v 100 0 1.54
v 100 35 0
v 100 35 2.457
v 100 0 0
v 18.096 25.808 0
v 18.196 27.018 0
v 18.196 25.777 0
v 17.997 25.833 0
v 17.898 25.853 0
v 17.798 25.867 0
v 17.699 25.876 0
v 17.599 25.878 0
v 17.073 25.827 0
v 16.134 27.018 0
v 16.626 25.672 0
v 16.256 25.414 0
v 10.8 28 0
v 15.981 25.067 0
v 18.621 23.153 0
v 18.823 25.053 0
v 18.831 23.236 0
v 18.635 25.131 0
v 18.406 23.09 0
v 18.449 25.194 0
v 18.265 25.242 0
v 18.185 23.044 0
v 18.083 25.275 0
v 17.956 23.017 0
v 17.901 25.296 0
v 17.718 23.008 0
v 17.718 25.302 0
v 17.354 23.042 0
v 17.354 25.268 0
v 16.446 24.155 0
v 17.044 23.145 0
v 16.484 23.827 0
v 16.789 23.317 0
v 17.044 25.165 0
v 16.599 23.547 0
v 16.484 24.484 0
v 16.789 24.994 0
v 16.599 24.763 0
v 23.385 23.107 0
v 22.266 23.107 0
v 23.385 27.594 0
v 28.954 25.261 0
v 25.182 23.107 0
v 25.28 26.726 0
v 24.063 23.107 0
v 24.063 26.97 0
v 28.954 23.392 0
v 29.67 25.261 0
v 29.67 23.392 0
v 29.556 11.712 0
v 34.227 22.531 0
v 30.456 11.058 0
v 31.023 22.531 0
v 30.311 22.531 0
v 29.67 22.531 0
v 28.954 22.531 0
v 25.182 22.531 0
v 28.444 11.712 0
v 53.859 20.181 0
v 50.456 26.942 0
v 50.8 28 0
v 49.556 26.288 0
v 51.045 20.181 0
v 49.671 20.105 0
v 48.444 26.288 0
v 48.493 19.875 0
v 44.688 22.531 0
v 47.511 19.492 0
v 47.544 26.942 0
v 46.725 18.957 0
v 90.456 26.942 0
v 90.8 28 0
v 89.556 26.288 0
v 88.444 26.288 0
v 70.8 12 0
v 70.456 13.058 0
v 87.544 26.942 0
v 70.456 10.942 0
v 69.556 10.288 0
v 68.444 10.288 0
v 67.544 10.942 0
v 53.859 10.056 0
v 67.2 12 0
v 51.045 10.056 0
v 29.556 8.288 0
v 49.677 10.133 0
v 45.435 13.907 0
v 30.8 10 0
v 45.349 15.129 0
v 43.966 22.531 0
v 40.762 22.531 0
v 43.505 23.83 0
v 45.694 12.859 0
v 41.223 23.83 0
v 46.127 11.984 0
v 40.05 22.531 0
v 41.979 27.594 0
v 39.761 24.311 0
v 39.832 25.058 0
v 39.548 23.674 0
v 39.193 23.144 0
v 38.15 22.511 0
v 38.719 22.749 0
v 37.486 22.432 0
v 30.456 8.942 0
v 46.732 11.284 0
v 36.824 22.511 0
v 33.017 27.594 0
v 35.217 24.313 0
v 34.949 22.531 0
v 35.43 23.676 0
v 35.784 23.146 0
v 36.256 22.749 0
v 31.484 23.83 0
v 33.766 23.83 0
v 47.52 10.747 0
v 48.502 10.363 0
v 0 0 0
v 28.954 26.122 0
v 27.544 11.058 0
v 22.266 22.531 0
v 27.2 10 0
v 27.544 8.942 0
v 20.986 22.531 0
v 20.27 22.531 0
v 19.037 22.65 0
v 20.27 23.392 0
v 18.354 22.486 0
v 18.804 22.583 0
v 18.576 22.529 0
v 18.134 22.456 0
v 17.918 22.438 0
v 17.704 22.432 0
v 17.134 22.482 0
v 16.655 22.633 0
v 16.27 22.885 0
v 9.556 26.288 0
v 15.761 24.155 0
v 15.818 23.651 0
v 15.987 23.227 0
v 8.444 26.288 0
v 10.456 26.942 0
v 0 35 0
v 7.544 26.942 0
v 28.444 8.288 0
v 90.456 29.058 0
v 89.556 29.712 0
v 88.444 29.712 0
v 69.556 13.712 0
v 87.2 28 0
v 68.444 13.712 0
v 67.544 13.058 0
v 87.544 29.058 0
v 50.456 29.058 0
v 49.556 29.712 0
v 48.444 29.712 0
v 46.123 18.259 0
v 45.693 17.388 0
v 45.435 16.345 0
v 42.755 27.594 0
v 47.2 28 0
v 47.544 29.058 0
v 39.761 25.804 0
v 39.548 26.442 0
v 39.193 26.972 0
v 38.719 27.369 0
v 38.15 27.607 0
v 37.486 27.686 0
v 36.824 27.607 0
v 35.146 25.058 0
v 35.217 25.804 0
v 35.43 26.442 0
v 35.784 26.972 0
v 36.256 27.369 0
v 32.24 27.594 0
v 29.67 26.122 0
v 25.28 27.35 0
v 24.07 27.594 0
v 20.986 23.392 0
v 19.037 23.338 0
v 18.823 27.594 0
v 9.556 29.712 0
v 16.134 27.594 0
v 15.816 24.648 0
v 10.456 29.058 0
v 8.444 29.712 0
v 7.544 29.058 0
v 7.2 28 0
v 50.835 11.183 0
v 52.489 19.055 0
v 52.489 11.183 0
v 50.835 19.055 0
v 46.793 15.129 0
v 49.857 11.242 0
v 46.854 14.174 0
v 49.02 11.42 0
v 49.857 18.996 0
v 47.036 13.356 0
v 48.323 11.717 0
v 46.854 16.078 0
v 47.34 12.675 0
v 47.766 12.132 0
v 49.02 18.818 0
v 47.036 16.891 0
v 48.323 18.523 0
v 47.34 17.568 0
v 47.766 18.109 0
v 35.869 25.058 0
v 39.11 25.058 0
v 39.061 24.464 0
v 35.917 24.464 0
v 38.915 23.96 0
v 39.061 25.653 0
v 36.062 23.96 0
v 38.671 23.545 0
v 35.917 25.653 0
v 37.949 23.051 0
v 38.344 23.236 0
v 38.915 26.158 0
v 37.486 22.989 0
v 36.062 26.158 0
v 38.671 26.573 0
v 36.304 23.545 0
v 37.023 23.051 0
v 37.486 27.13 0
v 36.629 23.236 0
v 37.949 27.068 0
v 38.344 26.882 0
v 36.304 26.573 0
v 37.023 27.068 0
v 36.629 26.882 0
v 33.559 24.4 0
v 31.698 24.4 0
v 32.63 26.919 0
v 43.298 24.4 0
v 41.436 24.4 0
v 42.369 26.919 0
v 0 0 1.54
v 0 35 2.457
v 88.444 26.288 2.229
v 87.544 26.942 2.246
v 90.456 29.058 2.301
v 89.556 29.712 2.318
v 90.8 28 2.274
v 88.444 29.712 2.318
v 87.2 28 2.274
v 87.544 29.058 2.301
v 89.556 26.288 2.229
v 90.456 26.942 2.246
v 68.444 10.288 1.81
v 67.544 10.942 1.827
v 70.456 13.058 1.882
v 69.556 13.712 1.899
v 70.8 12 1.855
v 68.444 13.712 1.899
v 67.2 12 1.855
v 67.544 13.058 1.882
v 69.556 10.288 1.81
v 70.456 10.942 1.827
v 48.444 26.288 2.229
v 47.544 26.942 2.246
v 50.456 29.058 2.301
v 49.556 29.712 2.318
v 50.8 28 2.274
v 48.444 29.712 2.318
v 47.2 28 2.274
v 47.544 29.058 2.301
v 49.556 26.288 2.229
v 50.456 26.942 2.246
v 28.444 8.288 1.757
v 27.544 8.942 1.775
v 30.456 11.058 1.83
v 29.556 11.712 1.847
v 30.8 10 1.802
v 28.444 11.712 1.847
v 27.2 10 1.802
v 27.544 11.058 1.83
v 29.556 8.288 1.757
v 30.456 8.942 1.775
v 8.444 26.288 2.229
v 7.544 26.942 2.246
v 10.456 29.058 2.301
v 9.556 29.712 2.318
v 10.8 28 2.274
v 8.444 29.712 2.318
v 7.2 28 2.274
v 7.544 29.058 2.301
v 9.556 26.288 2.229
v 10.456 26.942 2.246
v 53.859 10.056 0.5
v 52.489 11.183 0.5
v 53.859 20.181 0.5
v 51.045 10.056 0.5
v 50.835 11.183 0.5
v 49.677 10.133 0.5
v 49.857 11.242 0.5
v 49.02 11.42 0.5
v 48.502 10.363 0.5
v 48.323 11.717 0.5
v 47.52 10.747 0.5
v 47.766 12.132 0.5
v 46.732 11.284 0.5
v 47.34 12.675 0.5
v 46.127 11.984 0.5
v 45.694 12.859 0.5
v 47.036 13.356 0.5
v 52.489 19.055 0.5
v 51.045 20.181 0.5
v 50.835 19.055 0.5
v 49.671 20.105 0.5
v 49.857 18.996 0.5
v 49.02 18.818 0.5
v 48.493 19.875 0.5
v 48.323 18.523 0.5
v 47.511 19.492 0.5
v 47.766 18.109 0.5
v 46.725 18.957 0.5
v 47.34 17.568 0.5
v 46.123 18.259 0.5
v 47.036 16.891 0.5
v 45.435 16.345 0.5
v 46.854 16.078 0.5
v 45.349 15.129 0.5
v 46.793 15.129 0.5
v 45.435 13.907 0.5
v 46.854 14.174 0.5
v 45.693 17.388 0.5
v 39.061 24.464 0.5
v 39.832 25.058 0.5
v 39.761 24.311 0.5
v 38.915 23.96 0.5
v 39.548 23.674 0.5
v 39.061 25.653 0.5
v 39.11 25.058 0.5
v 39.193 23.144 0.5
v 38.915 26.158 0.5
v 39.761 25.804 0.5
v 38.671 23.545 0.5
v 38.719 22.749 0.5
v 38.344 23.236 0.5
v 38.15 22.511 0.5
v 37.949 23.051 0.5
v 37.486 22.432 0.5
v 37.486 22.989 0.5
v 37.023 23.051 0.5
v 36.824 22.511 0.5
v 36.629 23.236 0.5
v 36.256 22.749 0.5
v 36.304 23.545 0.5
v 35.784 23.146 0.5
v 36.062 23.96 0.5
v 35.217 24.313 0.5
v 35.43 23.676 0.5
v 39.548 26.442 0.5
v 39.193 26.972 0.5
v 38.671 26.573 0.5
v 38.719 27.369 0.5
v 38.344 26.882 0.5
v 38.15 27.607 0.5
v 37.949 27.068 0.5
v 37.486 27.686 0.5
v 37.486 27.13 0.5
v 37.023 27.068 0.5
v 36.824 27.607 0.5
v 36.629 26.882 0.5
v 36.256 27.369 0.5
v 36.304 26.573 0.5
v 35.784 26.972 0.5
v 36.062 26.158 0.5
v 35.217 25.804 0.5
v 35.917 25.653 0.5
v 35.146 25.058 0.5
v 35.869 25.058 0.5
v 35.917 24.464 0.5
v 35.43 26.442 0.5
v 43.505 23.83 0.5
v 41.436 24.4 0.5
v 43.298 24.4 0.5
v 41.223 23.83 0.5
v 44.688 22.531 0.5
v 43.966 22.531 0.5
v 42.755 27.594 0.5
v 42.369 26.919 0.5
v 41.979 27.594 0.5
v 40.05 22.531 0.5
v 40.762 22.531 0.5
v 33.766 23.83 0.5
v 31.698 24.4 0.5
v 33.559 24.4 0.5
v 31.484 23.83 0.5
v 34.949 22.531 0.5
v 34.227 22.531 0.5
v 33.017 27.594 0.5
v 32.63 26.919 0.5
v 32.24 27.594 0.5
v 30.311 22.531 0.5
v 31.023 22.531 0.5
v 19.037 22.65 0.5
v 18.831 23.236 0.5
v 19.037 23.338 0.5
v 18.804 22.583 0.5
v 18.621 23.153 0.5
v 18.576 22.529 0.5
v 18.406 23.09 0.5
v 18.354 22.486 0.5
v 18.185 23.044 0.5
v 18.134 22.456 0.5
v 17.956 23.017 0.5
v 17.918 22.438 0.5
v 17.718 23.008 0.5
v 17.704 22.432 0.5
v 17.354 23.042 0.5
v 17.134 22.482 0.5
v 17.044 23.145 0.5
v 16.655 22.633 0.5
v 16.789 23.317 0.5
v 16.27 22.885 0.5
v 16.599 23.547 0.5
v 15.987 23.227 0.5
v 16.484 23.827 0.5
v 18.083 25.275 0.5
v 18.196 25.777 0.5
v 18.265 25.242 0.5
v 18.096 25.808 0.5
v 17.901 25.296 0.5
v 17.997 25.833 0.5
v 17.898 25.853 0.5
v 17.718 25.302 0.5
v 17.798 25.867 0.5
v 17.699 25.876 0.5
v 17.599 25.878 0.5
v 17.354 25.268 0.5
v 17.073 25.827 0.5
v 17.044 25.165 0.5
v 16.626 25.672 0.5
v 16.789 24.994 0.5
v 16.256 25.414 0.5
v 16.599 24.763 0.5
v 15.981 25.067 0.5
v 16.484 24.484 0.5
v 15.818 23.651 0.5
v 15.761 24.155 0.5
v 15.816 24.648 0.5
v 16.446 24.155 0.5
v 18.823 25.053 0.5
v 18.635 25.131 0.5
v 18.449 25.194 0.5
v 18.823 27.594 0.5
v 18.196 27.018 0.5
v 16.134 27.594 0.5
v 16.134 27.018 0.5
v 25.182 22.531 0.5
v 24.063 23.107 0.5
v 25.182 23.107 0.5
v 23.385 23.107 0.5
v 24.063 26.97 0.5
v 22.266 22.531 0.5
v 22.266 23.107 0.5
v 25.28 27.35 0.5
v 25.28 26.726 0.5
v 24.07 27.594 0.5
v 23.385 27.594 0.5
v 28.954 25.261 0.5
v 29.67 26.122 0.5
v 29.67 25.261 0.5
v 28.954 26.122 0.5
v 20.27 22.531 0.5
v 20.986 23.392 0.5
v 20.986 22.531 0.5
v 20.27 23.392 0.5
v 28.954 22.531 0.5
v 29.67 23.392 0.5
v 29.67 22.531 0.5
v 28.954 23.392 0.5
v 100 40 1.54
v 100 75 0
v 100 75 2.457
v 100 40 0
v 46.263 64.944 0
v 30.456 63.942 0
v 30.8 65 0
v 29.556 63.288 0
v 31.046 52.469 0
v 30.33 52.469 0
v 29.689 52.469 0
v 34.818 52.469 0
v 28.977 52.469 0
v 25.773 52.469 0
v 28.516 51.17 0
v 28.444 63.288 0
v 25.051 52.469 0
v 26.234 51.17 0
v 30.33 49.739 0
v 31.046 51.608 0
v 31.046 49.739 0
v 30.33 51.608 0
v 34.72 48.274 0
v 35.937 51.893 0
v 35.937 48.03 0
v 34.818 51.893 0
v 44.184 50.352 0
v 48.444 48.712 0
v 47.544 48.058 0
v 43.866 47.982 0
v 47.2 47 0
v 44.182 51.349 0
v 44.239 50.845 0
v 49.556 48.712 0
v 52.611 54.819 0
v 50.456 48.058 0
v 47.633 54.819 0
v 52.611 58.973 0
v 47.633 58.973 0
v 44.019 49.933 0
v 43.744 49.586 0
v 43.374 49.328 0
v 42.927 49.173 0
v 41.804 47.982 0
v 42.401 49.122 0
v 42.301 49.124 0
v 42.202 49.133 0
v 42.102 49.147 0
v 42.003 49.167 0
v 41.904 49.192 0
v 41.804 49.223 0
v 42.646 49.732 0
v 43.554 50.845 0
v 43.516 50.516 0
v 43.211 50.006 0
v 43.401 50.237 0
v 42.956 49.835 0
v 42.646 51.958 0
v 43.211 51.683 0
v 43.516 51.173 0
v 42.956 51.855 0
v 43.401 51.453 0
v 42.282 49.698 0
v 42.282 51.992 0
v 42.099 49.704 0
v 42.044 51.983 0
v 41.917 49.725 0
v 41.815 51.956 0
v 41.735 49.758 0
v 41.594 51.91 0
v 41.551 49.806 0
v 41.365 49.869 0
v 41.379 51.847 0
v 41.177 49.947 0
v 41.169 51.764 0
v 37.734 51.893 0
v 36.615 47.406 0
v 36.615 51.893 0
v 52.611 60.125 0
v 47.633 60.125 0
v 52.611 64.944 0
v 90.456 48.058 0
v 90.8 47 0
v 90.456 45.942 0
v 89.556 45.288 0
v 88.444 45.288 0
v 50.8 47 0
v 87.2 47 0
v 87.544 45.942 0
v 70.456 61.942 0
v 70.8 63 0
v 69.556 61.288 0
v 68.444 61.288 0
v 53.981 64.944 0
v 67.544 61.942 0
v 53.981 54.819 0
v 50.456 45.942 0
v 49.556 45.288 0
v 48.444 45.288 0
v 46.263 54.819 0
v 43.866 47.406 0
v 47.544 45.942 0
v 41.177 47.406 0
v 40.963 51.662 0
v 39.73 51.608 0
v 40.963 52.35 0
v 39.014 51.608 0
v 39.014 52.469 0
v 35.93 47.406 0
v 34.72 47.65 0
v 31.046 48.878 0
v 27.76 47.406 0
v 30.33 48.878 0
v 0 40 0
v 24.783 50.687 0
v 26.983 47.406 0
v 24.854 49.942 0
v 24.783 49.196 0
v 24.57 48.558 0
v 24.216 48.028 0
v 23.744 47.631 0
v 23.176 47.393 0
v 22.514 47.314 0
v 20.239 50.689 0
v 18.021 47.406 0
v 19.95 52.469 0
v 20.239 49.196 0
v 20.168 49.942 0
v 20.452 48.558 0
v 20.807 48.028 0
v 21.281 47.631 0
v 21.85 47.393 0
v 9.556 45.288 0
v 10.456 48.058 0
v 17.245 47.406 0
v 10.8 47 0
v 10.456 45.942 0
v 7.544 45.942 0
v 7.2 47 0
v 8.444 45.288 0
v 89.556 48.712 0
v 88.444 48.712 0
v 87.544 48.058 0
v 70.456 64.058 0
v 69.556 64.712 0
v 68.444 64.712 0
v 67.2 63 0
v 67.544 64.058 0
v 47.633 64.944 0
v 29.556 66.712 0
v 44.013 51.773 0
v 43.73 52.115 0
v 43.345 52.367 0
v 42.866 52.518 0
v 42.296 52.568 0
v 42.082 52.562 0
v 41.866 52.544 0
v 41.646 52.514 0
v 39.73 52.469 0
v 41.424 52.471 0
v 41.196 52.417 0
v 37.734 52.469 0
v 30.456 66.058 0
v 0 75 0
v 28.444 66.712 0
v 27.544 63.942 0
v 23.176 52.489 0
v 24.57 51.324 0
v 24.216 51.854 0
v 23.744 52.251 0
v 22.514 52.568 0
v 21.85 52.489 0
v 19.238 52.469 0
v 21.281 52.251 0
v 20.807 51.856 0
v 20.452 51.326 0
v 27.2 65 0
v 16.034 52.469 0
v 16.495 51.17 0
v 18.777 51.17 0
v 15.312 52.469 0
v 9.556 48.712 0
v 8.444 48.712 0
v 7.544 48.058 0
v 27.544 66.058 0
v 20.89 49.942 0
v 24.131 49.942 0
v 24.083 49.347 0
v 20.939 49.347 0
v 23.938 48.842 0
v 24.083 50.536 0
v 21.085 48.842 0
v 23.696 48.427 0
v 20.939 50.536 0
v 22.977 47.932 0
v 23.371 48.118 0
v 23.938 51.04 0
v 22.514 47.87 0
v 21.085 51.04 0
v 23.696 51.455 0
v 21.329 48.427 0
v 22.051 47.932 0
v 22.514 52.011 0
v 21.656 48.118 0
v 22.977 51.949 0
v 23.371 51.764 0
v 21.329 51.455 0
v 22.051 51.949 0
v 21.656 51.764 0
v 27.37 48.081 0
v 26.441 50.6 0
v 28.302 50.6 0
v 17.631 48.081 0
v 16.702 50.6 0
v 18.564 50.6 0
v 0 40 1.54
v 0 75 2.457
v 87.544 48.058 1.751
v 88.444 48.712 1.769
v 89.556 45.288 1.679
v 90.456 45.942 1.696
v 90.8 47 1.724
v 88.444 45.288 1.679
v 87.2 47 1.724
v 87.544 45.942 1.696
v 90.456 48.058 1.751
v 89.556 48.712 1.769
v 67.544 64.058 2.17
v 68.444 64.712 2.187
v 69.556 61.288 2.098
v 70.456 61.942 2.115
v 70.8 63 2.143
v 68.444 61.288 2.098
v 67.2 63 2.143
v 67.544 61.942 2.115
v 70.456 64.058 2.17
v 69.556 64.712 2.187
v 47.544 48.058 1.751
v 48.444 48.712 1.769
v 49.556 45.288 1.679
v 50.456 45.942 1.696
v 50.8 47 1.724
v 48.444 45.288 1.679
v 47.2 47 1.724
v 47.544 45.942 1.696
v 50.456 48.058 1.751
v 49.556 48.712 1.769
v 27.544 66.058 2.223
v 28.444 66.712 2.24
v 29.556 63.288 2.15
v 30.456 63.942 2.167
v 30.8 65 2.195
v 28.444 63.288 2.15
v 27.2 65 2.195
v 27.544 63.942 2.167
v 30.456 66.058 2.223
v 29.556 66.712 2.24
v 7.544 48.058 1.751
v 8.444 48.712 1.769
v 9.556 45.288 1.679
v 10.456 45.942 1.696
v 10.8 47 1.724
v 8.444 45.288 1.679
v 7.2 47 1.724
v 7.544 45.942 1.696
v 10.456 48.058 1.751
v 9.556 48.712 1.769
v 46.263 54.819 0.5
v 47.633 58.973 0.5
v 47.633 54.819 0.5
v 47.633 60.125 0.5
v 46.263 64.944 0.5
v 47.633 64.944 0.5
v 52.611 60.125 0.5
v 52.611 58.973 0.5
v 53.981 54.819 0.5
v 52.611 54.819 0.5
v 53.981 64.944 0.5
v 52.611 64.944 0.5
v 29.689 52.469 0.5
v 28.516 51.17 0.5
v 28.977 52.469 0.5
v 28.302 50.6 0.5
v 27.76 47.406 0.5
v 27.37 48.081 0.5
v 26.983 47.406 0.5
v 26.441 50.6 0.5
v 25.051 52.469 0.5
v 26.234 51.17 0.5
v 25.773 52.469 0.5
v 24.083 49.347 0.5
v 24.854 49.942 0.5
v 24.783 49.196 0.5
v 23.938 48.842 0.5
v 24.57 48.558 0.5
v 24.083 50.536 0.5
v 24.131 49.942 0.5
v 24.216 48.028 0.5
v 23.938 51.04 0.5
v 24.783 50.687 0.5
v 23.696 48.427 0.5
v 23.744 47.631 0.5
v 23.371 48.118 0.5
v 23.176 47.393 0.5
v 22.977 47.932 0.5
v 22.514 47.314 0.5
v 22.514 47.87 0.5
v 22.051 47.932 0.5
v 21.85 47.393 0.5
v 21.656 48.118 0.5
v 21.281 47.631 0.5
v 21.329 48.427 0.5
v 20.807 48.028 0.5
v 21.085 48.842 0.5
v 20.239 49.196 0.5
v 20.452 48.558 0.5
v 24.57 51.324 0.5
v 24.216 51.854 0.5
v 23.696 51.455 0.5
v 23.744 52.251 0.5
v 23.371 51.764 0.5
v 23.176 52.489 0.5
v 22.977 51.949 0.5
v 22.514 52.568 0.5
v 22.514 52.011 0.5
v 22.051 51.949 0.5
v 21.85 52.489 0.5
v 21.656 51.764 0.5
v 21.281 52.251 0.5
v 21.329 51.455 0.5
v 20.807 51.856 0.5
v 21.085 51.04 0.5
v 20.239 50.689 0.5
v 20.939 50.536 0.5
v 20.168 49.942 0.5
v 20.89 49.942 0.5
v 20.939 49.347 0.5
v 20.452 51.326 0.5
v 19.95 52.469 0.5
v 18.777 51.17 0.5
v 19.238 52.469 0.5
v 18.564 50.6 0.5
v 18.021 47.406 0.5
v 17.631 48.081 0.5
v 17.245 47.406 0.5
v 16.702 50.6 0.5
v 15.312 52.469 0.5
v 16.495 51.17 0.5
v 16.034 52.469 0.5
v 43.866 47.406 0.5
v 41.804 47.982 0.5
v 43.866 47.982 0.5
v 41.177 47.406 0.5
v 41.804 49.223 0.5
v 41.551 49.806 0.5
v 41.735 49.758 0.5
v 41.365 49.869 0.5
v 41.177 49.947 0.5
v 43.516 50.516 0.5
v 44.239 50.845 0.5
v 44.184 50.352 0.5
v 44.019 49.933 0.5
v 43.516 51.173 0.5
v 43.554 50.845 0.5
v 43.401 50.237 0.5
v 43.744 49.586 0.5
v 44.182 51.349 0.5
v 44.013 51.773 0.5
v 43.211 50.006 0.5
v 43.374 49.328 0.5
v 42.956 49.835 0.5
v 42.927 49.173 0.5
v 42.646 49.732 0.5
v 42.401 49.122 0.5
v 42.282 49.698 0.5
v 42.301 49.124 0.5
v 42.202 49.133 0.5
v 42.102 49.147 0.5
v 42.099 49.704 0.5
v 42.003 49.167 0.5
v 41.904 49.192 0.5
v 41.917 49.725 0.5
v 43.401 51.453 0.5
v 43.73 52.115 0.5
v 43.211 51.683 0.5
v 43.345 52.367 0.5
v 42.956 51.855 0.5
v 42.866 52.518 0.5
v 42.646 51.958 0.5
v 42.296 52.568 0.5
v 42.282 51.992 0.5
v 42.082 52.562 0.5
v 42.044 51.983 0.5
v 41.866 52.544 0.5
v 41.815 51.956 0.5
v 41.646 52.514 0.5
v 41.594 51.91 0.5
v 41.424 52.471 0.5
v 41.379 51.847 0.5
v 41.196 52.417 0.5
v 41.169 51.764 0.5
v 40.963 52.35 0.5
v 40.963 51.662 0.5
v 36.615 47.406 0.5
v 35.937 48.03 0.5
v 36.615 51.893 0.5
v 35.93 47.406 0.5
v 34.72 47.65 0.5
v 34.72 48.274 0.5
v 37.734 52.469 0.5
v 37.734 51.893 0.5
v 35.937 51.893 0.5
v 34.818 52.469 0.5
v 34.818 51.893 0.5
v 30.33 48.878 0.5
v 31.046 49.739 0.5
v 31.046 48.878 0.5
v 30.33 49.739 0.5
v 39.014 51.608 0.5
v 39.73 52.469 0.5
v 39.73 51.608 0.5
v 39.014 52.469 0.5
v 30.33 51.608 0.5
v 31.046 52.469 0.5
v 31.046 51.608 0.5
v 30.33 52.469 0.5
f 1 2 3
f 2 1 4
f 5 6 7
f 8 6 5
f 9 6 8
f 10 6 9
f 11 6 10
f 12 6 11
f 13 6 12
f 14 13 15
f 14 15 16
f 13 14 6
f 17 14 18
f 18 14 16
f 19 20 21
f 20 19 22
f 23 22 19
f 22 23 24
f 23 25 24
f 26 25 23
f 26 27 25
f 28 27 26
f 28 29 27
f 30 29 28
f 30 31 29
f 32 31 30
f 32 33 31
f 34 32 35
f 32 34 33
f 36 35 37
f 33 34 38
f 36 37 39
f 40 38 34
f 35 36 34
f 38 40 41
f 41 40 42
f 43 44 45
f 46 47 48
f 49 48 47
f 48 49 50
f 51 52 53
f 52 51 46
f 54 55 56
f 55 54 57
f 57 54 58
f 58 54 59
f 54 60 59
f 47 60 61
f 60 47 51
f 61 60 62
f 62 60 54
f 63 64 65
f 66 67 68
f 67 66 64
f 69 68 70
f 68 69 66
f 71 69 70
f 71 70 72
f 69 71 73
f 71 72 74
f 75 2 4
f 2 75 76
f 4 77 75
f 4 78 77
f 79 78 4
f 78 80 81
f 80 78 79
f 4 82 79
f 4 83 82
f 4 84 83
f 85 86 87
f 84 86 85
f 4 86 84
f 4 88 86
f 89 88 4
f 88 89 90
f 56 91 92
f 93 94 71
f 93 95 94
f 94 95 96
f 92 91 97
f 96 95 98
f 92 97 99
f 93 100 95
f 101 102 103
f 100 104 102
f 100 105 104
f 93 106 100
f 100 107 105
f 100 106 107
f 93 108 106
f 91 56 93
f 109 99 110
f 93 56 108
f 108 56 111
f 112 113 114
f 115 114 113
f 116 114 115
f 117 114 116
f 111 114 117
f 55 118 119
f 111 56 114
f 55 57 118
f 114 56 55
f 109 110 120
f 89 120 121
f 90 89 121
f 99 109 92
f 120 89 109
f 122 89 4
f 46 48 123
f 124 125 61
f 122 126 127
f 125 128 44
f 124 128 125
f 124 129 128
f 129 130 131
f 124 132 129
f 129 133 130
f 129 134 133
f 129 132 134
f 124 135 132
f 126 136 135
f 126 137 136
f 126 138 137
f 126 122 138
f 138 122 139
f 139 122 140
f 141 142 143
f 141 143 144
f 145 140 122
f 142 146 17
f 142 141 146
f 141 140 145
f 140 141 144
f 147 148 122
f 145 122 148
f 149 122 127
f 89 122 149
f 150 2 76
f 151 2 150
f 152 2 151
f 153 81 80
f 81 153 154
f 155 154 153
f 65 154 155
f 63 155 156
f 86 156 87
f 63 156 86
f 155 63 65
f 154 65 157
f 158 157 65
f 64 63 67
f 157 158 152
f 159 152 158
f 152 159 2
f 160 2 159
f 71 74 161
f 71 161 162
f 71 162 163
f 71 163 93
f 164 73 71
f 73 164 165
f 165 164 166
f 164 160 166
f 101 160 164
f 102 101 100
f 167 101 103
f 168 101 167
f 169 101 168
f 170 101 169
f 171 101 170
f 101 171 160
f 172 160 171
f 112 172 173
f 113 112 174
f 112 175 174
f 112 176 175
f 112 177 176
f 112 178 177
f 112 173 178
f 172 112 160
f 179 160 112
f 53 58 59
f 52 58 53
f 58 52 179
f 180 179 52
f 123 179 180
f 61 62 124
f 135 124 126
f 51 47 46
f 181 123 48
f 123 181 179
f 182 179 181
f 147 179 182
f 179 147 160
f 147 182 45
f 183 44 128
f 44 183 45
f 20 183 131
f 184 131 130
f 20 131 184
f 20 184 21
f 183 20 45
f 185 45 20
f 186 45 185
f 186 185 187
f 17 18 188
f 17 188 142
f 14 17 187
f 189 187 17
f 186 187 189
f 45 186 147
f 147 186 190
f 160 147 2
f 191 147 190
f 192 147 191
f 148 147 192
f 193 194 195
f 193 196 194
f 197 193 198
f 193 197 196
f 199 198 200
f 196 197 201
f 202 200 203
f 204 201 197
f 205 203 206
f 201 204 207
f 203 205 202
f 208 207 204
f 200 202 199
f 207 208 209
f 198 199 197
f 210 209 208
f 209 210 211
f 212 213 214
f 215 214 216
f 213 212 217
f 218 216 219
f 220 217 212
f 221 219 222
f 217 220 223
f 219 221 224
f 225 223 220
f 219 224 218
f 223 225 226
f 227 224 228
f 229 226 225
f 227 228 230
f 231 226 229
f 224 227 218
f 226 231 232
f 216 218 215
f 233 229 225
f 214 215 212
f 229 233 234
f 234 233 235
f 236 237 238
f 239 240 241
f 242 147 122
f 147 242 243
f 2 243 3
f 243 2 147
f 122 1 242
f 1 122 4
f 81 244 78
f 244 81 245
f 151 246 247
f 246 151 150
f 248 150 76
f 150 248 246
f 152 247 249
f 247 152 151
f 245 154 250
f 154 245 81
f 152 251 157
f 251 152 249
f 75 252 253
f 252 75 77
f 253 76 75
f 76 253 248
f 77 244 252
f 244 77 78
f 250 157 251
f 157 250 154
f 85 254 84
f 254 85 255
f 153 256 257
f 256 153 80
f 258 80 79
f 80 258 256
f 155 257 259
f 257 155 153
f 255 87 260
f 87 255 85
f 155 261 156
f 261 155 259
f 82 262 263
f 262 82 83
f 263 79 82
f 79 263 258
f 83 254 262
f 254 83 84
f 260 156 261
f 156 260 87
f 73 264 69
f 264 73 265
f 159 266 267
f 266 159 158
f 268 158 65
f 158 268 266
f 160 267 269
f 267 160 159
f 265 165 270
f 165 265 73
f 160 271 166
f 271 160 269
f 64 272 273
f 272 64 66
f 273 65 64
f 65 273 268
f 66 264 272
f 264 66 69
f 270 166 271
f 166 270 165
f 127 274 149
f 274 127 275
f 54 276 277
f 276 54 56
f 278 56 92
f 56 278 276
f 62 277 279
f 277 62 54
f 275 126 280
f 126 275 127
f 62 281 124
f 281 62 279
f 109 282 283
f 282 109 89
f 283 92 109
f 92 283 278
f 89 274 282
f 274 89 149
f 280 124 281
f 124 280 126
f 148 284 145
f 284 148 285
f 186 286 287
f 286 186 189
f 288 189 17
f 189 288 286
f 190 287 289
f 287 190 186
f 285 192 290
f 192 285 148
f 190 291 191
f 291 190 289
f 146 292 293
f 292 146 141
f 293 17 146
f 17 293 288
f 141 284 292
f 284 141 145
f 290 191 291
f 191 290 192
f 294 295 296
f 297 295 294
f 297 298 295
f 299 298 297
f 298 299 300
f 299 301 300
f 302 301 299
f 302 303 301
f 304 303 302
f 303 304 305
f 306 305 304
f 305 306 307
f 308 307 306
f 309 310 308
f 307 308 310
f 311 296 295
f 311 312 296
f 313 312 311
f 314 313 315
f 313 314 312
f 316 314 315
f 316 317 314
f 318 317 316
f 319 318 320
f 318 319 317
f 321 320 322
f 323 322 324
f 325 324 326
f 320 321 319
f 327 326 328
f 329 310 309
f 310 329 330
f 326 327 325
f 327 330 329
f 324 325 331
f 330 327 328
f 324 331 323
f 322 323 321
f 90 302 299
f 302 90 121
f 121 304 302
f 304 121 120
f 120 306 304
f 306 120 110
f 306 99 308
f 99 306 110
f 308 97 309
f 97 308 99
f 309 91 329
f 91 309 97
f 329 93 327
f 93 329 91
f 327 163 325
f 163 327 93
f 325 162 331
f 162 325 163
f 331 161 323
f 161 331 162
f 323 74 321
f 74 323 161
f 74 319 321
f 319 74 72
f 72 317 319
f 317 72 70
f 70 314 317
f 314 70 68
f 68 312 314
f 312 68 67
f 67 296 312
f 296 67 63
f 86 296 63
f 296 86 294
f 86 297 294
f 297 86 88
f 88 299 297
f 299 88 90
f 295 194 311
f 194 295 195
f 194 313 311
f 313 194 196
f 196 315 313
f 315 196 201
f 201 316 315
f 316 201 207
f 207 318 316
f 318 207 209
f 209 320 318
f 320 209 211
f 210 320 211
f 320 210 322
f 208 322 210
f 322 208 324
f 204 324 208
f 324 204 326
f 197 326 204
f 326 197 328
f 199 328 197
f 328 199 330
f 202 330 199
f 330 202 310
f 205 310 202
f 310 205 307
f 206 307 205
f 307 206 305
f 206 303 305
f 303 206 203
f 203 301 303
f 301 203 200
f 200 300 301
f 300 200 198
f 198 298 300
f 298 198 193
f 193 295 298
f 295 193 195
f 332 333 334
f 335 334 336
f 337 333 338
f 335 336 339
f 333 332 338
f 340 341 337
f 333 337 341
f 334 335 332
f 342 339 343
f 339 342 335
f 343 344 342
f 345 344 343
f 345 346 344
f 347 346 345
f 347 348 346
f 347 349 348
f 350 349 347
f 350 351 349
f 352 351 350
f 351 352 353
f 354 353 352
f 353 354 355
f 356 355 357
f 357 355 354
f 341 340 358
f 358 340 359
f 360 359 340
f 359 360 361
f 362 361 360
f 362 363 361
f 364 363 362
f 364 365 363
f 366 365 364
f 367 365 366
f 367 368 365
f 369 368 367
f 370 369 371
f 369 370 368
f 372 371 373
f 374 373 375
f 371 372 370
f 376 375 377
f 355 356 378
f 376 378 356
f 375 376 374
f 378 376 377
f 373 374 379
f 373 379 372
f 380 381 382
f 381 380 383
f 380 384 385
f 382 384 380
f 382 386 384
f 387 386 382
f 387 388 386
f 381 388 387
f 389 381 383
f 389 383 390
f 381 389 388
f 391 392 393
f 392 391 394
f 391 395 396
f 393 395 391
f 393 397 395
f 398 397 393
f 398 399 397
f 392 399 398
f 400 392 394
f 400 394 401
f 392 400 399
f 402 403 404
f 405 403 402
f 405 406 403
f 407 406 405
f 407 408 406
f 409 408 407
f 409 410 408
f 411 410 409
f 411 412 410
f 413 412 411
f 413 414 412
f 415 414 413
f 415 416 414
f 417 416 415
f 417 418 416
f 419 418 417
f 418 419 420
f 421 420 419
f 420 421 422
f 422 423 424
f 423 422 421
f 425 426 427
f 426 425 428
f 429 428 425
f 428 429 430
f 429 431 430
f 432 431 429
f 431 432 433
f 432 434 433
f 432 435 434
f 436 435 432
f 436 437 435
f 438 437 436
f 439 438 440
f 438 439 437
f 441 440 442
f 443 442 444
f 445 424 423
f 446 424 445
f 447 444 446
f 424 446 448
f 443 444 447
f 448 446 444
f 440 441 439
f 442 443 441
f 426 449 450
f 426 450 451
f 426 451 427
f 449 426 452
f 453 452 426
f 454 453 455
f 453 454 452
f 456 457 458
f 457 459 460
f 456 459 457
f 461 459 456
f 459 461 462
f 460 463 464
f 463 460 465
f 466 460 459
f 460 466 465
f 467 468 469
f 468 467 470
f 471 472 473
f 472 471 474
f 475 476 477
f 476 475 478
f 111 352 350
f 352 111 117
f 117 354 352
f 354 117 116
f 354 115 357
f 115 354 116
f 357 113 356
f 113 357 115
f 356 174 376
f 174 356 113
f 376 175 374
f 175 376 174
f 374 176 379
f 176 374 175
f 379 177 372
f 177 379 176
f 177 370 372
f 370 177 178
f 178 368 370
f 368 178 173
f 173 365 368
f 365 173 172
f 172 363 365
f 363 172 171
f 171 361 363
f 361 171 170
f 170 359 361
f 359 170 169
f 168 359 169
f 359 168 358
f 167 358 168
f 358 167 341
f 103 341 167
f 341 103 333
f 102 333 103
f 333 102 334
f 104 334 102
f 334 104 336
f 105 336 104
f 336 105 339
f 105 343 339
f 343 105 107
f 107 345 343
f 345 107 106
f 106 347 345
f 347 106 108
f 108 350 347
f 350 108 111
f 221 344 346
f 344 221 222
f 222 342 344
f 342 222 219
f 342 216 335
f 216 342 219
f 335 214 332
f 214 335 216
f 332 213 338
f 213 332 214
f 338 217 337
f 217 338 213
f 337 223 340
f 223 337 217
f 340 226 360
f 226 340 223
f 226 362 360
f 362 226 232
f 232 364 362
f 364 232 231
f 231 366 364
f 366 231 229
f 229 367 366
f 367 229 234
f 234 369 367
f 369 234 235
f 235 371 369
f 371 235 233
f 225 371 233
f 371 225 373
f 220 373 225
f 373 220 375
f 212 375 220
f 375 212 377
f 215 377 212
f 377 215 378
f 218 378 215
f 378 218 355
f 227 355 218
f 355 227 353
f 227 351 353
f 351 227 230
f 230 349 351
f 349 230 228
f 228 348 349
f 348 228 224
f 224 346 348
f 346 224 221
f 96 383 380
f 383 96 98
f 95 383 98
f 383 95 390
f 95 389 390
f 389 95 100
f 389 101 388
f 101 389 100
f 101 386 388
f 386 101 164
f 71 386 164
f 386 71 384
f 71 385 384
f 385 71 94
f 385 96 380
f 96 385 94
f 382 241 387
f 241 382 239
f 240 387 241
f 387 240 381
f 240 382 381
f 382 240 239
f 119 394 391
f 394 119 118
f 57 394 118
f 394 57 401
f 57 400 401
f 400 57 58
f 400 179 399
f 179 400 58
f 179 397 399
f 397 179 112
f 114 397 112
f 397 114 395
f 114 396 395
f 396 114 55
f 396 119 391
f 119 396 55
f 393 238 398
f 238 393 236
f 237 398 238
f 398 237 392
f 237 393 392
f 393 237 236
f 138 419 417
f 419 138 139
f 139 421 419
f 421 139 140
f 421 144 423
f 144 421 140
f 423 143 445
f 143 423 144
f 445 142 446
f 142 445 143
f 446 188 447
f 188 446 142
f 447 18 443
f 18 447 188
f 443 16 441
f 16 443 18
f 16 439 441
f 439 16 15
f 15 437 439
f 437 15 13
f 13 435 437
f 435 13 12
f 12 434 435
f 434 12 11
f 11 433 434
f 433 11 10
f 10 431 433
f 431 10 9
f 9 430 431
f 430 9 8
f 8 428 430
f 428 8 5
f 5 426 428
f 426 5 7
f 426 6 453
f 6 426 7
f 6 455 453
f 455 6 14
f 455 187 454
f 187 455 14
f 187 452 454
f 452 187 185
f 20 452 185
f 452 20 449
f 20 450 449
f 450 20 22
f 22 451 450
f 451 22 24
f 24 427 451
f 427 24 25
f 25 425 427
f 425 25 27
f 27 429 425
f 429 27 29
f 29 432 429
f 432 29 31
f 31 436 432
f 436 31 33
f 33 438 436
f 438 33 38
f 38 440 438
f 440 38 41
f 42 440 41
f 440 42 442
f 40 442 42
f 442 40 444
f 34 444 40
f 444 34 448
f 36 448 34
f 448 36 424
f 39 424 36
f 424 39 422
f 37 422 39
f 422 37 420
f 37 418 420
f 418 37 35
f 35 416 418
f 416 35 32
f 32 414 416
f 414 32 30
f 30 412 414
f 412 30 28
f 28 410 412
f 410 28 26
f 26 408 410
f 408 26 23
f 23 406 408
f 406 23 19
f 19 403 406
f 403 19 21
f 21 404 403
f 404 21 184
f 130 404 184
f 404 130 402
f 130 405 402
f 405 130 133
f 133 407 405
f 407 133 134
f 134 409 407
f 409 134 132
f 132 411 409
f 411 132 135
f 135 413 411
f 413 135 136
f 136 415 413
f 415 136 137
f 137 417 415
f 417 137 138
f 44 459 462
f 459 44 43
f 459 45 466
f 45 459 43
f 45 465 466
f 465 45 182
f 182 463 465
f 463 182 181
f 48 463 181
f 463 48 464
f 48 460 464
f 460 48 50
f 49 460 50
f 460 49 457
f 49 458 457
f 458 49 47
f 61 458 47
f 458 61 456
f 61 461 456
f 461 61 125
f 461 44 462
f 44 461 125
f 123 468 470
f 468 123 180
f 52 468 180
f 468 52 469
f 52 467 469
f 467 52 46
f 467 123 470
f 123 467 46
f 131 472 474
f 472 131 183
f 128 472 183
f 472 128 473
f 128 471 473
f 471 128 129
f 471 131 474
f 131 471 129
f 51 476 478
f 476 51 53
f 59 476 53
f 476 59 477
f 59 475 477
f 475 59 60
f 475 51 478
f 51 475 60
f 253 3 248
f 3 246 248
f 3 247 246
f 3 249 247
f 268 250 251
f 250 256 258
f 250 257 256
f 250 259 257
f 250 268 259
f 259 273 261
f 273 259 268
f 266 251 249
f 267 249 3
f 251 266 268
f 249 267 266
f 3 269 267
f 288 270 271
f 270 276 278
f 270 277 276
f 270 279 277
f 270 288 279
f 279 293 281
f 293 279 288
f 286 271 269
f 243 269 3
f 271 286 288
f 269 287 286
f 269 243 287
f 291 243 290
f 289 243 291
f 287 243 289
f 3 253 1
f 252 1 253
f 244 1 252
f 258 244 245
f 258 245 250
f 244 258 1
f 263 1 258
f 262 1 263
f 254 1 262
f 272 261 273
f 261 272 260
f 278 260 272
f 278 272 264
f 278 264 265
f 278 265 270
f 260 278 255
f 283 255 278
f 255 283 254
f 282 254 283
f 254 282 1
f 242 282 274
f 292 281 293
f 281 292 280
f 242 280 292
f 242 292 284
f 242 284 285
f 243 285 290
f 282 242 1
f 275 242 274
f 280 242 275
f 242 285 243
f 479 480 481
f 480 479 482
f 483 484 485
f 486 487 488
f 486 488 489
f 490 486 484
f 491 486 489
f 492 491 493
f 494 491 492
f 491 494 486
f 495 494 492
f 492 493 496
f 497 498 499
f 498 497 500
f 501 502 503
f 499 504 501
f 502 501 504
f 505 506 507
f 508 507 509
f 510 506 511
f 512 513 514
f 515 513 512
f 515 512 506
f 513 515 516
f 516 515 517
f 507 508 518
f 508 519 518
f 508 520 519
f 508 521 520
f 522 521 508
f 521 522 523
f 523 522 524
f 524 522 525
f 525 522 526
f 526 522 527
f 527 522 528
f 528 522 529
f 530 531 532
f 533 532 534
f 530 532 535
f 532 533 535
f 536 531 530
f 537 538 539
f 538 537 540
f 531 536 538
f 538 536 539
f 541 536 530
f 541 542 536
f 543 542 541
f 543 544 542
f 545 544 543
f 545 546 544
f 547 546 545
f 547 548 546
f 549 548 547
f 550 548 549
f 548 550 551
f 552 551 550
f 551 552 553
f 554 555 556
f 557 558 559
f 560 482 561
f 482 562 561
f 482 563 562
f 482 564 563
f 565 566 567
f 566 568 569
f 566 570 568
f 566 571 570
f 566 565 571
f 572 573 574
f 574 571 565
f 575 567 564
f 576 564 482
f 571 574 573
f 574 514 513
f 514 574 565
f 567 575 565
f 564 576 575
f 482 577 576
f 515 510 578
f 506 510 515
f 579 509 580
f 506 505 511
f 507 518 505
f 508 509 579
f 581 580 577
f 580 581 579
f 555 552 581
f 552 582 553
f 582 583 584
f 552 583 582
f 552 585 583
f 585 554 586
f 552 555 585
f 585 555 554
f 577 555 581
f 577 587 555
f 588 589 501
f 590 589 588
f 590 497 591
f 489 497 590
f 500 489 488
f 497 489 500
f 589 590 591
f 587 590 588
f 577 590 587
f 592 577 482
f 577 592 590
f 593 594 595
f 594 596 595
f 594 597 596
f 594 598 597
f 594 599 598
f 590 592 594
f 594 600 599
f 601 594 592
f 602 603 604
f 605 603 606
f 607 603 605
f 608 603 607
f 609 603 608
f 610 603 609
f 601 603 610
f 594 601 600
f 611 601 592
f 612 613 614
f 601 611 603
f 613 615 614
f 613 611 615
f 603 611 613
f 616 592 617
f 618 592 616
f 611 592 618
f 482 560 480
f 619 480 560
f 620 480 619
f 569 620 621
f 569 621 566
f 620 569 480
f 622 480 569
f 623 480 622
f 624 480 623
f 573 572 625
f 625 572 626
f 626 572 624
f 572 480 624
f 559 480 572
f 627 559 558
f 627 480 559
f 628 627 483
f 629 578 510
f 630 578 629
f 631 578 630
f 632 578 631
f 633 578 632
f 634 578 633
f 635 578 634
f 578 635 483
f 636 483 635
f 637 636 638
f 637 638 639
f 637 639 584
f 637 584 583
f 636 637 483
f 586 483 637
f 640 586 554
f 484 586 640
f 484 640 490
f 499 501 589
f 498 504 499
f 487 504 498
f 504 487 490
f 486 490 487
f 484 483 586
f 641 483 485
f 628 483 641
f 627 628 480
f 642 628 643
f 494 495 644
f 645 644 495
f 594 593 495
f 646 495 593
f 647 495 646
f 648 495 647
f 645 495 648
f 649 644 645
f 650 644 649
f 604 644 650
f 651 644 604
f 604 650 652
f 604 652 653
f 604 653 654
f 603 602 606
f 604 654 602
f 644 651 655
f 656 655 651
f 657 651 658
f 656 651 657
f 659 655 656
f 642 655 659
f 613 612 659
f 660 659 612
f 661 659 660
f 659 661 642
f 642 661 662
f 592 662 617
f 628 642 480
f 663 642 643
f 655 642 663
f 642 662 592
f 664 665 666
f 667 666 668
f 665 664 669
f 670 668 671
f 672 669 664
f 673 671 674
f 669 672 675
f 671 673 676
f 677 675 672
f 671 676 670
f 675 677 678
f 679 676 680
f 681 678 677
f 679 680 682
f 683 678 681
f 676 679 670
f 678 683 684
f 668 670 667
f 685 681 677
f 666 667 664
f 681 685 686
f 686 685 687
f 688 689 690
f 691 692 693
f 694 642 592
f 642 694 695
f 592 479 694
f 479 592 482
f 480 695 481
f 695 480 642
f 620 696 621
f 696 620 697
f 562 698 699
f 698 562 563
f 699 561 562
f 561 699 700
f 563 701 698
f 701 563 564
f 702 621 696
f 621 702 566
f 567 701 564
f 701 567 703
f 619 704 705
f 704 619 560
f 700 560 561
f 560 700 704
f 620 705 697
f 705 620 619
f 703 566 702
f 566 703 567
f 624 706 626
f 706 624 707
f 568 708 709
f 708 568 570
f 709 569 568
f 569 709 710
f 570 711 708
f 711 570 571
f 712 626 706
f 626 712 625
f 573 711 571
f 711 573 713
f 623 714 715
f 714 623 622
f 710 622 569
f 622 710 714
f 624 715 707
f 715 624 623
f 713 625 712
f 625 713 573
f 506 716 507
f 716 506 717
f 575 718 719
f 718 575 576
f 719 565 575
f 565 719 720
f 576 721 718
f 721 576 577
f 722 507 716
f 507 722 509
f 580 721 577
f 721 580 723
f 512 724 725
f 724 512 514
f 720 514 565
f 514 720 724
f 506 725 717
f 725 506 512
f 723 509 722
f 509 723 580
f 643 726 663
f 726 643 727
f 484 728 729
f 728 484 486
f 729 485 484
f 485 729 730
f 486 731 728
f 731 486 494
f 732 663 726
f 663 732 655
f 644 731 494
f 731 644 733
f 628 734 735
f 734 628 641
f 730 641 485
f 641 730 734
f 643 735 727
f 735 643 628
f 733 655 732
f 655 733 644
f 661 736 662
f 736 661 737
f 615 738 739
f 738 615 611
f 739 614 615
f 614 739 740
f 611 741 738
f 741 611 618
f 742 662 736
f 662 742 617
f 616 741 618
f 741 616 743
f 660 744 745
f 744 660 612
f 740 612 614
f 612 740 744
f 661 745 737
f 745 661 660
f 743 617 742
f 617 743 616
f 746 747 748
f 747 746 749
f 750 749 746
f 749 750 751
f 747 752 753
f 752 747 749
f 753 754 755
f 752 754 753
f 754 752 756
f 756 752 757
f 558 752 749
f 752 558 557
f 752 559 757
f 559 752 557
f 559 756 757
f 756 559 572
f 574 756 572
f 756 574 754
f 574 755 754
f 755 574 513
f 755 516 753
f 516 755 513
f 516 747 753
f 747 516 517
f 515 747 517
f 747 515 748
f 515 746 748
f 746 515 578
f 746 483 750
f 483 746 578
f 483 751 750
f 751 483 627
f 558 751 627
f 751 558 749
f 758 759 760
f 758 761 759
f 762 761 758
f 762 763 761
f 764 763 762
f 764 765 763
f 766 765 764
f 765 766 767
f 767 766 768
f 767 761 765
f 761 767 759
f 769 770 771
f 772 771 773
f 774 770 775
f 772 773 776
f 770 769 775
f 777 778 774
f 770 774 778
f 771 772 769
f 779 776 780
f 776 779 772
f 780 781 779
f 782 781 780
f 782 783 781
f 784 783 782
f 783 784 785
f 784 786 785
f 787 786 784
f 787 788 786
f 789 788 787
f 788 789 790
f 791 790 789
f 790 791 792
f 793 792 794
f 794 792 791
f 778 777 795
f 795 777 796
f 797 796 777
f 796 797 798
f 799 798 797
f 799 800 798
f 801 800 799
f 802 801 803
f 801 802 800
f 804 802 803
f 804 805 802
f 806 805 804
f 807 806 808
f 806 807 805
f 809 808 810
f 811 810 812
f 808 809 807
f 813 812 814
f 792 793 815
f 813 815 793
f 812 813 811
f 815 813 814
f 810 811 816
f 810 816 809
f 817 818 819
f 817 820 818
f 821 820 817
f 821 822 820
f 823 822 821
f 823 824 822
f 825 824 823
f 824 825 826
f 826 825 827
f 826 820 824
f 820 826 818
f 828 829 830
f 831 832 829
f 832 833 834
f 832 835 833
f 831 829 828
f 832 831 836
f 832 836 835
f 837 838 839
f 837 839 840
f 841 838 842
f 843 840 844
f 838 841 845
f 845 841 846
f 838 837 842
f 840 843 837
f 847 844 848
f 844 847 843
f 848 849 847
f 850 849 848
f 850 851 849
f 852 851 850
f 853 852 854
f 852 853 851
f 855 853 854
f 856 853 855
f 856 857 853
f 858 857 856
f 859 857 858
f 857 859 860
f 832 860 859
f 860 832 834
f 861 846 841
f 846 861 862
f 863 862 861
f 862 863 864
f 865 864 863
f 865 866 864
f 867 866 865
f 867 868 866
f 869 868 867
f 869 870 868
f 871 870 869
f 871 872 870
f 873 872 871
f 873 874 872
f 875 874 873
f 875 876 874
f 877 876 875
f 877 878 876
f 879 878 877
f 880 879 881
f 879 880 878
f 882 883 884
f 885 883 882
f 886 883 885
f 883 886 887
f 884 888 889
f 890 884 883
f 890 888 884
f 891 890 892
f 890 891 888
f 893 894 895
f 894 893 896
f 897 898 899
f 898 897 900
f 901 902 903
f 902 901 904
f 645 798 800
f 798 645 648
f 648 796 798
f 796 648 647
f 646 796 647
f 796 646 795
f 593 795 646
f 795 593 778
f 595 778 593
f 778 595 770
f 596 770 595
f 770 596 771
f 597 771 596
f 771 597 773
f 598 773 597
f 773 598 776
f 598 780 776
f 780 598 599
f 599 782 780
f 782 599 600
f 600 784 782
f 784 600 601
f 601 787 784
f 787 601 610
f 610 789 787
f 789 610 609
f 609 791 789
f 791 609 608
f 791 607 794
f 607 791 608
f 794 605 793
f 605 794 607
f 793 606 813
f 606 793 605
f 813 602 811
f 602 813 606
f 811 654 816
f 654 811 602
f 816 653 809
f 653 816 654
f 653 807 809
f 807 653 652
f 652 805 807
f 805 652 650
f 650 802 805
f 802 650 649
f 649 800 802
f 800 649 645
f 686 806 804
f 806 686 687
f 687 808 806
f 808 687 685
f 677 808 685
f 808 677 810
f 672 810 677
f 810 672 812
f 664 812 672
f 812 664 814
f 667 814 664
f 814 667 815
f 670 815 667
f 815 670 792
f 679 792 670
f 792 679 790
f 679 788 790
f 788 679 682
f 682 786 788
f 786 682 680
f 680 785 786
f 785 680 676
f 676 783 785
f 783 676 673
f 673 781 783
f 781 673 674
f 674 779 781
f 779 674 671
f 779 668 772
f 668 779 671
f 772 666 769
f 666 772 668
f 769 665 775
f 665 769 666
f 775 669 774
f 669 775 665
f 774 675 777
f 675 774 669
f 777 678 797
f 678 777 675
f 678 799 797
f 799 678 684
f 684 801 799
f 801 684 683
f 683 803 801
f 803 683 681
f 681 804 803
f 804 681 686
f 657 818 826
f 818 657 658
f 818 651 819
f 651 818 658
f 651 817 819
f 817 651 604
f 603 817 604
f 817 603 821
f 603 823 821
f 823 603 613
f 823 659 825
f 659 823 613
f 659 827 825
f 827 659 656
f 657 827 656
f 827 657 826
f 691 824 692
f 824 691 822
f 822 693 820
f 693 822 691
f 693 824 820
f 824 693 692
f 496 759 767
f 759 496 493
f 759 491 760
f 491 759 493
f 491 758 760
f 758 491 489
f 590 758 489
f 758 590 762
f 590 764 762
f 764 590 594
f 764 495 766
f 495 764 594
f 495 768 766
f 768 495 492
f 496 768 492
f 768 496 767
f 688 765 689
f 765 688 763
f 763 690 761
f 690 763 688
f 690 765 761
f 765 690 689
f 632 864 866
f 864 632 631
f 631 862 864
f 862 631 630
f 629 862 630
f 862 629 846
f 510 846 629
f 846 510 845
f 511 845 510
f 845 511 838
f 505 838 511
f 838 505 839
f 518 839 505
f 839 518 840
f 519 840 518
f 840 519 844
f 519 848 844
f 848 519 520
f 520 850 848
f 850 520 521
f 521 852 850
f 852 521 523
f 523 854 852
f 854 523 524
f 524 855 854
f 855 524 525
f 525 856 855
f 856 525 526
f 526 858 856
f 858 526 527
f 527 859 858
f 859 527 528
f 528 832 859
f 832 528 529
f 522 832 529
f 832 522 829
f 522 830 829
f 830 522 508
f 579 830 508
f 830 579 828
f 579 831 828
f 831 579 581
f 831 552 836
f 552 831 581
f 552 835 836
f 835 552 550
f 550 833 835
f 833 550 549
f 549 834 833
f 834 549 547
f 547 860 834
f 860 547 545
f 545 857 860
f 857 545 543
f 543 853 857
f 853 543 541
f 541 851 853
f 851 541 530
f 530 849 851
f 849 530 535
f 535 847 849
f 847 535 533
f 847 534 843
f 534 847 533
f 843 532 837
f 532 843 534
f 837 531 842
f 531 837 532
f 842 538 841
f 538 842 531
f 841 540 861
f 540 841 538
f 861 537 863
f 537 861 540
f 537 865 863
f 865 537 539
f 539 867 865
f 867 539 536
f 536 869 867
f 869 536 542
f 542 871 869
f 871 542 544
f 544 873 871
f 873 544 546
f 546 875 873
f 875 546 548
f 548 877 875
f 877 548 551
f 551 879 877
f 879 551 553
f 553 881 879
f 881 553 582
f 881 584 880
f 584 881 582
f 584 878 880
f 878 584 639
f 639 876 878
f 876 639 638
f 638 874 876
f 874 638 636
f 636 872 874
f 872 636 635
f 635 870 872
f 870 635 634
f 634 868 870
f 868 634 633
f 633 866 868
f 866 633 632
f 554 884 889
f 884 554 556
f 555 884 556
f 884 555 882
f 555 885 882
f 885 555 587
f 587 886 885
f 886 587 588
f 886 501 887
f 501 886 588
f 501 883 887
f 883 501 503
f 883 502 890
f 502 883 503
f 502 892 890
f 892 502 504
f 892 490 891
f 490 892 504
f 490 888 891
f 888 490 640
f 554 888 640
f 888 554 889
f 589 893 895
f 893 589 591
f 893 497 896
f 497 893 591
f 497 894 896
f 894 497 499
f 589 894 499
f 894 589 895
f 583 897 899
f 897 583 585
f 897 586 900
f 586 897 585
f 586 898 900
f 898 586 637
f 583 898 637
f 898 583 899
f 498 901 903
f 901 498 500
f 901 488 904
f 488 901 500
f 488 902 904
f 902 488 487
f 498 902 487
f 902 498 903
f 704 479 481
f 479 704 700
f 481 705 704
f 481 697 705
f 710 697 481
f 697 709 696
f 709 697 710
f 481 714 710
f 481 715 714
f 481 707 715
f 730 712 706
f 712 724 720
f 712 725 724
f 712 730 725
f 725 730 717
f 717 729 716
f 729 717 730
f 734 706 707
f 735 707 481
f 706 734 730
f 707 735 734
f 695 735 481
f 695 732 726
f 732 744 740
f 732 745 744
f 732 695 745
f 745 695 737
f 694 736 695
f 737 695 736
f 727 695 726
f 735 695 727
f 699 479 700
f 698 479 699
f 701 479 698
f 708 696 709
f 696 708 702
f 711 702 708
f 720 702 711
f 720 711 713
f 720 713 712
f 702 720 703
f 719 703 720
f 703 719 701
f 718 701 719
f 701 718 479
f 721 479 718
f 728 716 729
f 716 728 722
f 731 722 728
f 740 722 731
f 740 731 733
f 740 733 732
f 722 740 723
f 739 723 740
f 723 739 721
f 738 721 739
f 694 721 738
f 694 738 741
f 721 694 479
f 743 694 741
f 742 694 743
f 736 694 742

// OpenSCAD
// file: ../lib/naca4.scad
// Naca4.scad - library for parametric airfoils of 4 digit NACA series
// Code: Rudolf Huttary, Berlin
// June 2015
// commercial use prohibited


// general use: for more examples refer to sampler.scad
// naca = naca digits or 3el vector  (default = 12 or [0, 0, .12])
// L    = chord length [mm]      (default= 100)
// N    = # sample points        (default= 81)
// h    = height [mm]            (default= 1)
// open = close at the thin end? (default = true)
// two equivalent example calls
 airfoil(naca = 2408, L = 60, N=1001, h = 30, open = false);
// airfoil(naca = [.2, .4, .32], L = 60, N=1001, h = 30, open = false);

module help()
{
  echo(str("\n\nList of signatures in lib:\n=================\n",
  "module airfoil(naca=2412, L = 100, N = 81, h = 1, open = false) - renders airfoil object\n",
  "module airfoil(naca=[.2, .4, .12], L = 100, N = 81, h = 1, open = false) - renders airfoil object using percentage for camber,  camber distance and thicknes\n",
  "function airfoil_data(naca=12, L = 100, N = 81, open = false)\n",
  "=================\n"));
}

help();
// this is the object
module airfoil(naca=12, L = 100, N = 81, h = 1, open = false)
{
  linear_extrude(height = h)
  polygon(points = airfoil_data(naca, L, N, open));
}

module hollow_airfoil(naca=12, L = 100, N = 81, h = 1, open = false, wall_thickness = 1)
{
    if (open){
        linear_extrude(height = h)

        if (wall_thickness>0){
            difference(){
                polygon(points = airfoil_data(naca, L, N, false));
                offset(delta = - wall_thickness, chamfer = false) polygon(points = airfoil_data(naca, L, N, open = false));
            }
        }
        else{
            difference(){
                offset(delta = - wall_thickness, chamfer = false) polygon(points = airfoil_data(naca, L, N, open = false));
                polygon(points = airfoil_data(naca, L, N, false));
            }
        }
    }
    else{

        linear_extrude(height = abs(wall_thickness))
            polygon(points = airfoil_data(naca, L, N, false));

        linear_extrude(height = h)
            difference(){
                polygon(points = airfoil_data(naca, L, N, open));
                offset(delta = - wall_thickness) polygon(points = airfoil_data(naca, L, N, open = false));
            }

        translate([0,0, h - wall_thickness])
            linear_extrude(height = abs(wall_thickness))
                polygon(points = airfoil_data(naca, L, N, false));

    }
}


// this is the main function providing the airfoil data
function airfoil_data(naca=12, L = 100, N = 81, open = false) =
  let(Na = len(naca)!=3?NACA(naca):naca)
  let(A = [.2969, -0.126, -.3516, .2843, open?-0.1015:-0.1036])
  [for (b=[-180:360/(N):179.99])
    let (x = (1-cos(b))/2)
    let(yt = sign(b)*Na[2]/.2*(A*[sqrt(x), x, x*x, x*x*x, x*x*x*x]))
    Na[0]==0?L*[x, yt]:L*camber(x, yt, Na[0], Na[1], sign(b))];


function trailing_edge_angle(naca=12, open = false) =
  let(Na = len(naca)!=3?NACA(naca):naca)
  let(A = [.2969, -0.126, -.3516, .2843, open?-0.1015:-0.1036])
  let (x =0.999)  // set x near to airfoil trailing edge
  let(yt = Na[2]/.2*(A*[sqrt(x), x, x*x, x*x*x, x*x*x*x])) // calculate distance from x-axis at previously set position
  atan2(yt,1-x);  // calculate angle of triangle between end of airfoil. The triange height corresponds to previously calculated distance from x-axis

function surface_angle(x = 0.5, naca=12, open = false) =
  let(Na = len(naca)!=3?NACA(naca):naca)
  let(A = [0.2969, -0.126, -0.3516, 0.2843, open?-0.1015:-0.1036])
  let(dy = Na[2]/0.2*(A*[(1/2)*(1/sqrt(x)), 1, 2*x, 3*x*x, 4*x*x*x])) // calculate derivative of airfoil function at the x point
  atan(dy);  // calculate  the angle from function derivative

function surface_distance(x = 0.5, naca=12, open = false) =
  let(Na = len(naca)!=3?NACA(naca):naca)
  let(A = [0.2969, -0.126, -0.3516, 0.2843, open?-0.1015:-0.1036])
  Na[2]/.2*(A*[sqrt(x), x, x*x, x*x*x, x*x*x*x]); // calculate distance from x-axis at previously set position

// helper functions
function NACA(naca) =
  let (M = floor(naca/1000))
  let (P = floor((naca-M*1000)/100))
  [M/100, P/10, floor(naca-M*1000-P*100)/100];

function camber(x, y, M, P, upper) =
  let(yc = (x<P)?M/P/P*(2*P*x-x*x): M/(1-P)/(1-P)*(1 - 2*P + 2*P*x -x*x))
  let(dy = (x<P)?2*M/P/P*(P-x):2*M/(1-P)/(1-P)*(P-x))
  let(th = atan(dy))
  [upper ? x - y*sin(th):x + y*sin(th), upper ? yc + y*cos(th):yc - y*cos(th)];
// file: ../666_1247.scad
use <./lib/naca4.scad>
include <../parameters.scad>

module 666_1247(angle_of_attact){
	union(){
		difference(){
			cube([100,35,12]);

			translate([9+ 20 + 20 + 20 + 20,35-7,-1])
				cylinder (h = 20, r = 3.6/2, $fn = 10);

			translate([9 + 20 + 20 + 20, 35-23, -1])	
				cylinder (h = 20, r = 3.6/2, $fn = 10);

			translate([9 + 20 + 20,35-7,-1])	
    			cylinder (h = 20, r = 3.6/2, $fn = 10);

			translate([9 + 20, 35-25, -1])	
    			cylinder (h = 20, r = 3.6/2, $fn = 10);

			translate([9,35-7,-1])	
				cylinder (h = 20, r = 3.6/2, $fn = 10);

            translate([50, 15, 11.5])
                linear_extrude(0.5) 
                    text("H", size = 10, halign = "center", valign = "center", font = "PT Sans");

            translate([30, 25, 11.5])
                linear_extrude(0.5) 
                    text( str("AOA: ", angle_of_attact), size = 5, halign = "center", valign = "center", font = "PT Sans");

            translate([50, 15, 0.5])
                rotate([0,180, 0])       
                linear_extrude(0.5) 
                    text("D", size = 10, halign = "center", valign = "center", font = "PT Sans");

            translate([30, 25, 0.5])
                rotate([0,180, 0])       
                linear_extrude(0.5) 
                    text(str("AOA: ", angle_of_attact), size = 5, halign = "center", valign = "center", font = "PT Sans");

            translate([0,35/2,12/2])      // set AOA
                rotate([angle_of_attact,0,0])       
                    cube([400, 400, 8], center = true);
		}
	}
}

module 666_1247_H(angle_of_attact){
    intersection(){
        translate([-1,0,5])      
            cube([200, 100, 20]);
        666_1247(angle_of_attact);
    }
}

module 666_1247_D(angle_of_attact){
    intersection(){
        translate([-1,0,0])      
            cube([200, 100, 5]);
        666_1247(angle_of_attact);
    }
}


666_1247_H(rotor_blade_AOA);

666_1247_D(rotor_blade_AOA);
// main file
include <../../parameters.scad>
use <../666_1247.scad>

666_1247_D(rotor_blade_AOA);

translate([0,75,12])
    rotate([180,0,0])
        666_1247_H(rotor_blade_AOA);
